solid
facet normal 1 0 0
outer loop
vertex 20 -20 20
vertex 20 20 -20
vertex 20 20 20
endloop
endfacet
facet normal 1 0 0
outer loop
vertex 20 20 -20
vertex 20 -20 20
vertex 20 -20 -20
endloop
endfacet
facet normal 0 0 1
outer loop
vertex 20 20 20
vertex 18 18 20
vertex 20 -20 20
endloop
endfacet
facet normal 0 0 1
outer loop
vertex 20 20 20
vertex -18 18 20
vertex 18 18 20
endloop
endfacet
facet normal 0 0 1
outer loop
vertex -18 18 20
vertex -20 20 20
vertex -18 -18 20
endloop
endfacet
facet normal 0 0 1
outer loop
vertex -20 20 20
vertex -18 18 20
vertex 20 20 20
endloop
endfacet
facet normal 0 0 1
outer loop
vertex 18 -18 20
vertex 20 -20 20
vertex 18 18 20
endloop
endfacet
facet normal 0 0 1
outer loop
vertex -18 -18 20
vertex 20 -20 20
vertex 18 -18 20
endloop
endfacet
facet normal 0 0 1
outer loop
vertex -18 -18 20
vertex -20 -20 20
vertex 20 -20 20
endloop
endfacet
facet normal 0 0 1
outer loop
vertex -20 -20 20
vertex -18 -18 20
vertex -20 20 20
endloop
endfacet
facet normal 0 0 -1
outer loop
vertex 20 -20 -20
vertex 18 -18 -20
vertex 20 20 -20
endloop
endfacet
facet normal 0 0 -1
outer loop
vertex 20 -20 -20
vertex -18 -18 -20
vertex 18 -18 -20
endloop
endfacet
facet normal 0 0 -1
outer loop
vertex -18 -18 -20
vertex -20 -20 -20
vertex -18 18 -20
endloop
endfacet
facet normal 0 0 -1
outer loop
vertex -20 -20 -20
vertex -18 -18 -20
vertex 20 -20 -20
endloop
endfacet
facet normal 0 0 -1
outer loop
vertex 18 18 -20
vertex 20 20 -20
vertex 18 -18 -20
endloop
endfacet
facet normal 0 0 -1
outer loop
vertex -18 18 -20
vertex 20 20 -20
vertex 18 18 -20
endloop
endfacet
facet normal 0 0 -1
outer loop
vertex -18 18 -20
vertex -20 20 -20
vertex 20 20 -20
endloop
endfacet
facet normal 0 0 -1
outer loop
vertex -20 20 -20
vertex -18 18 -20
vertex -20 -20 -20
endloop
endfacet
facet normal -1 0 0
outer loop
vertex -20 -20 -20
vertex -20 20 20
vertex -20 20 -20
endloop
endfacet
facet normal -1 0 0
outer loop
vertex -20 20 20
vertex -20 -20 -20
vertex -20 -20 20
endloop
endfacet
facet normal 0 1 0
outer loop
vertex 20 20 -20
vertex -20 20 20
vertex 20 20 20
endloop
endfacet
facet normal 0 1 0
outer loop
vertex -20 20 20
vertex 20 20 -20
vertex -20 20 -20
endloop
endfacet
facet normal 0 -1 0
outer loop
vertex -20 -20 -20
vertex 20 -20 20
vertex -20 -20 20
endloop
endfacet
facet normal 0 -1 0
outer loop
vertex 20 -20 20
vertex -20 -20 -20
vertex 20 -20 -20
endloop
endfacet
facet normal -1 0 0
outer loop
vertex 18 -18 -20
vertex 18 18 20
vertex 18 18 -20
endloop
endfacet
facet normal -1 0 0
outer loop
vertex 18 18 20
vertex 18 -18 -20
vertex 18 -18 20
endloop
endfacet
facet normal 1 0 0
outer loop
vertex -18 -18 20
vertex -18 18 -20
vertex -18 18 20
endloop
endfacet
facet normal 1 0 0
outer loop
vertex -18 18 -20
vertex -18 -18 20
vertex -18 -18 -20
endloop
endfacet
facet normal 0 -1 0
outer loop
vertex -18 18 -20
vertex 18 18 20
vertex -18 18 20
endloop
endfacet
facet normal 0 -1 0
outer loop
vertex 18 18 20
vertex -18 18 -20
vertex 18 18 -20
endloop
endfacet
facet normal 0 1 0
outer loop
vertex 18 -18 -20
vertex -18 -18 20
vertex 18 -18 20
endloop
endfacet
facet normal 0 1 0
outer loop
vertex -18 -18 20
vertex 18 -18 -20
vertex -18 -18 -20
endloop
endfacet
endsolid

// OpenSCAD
scoop = 40;
wall = 2;
 
difference() {
	cube([scoop,scoop,scoop], true); //body
	cube([scoop-(wall*2),scoop-(wall*2),scoop+wall],true);	//aperture
}

difference() {
	cube([scoop,scoop,scoop], true); //body
	cube([scoop-(wall*2),scoop-(wall*2),scoop+wall],true);	//aperture
}



/*
translate([-sqrt(40*40 + 40*40),0,0]) {
translate([-scoop*1.5,0,0]) cube([scoop*3,scoop,scoop]); //half cube
difference() {
	cylinder(40,20,20);
	translate([-20,0,0]) cube([40,20,40]);
	cylinder(40,15,15);
}*/
